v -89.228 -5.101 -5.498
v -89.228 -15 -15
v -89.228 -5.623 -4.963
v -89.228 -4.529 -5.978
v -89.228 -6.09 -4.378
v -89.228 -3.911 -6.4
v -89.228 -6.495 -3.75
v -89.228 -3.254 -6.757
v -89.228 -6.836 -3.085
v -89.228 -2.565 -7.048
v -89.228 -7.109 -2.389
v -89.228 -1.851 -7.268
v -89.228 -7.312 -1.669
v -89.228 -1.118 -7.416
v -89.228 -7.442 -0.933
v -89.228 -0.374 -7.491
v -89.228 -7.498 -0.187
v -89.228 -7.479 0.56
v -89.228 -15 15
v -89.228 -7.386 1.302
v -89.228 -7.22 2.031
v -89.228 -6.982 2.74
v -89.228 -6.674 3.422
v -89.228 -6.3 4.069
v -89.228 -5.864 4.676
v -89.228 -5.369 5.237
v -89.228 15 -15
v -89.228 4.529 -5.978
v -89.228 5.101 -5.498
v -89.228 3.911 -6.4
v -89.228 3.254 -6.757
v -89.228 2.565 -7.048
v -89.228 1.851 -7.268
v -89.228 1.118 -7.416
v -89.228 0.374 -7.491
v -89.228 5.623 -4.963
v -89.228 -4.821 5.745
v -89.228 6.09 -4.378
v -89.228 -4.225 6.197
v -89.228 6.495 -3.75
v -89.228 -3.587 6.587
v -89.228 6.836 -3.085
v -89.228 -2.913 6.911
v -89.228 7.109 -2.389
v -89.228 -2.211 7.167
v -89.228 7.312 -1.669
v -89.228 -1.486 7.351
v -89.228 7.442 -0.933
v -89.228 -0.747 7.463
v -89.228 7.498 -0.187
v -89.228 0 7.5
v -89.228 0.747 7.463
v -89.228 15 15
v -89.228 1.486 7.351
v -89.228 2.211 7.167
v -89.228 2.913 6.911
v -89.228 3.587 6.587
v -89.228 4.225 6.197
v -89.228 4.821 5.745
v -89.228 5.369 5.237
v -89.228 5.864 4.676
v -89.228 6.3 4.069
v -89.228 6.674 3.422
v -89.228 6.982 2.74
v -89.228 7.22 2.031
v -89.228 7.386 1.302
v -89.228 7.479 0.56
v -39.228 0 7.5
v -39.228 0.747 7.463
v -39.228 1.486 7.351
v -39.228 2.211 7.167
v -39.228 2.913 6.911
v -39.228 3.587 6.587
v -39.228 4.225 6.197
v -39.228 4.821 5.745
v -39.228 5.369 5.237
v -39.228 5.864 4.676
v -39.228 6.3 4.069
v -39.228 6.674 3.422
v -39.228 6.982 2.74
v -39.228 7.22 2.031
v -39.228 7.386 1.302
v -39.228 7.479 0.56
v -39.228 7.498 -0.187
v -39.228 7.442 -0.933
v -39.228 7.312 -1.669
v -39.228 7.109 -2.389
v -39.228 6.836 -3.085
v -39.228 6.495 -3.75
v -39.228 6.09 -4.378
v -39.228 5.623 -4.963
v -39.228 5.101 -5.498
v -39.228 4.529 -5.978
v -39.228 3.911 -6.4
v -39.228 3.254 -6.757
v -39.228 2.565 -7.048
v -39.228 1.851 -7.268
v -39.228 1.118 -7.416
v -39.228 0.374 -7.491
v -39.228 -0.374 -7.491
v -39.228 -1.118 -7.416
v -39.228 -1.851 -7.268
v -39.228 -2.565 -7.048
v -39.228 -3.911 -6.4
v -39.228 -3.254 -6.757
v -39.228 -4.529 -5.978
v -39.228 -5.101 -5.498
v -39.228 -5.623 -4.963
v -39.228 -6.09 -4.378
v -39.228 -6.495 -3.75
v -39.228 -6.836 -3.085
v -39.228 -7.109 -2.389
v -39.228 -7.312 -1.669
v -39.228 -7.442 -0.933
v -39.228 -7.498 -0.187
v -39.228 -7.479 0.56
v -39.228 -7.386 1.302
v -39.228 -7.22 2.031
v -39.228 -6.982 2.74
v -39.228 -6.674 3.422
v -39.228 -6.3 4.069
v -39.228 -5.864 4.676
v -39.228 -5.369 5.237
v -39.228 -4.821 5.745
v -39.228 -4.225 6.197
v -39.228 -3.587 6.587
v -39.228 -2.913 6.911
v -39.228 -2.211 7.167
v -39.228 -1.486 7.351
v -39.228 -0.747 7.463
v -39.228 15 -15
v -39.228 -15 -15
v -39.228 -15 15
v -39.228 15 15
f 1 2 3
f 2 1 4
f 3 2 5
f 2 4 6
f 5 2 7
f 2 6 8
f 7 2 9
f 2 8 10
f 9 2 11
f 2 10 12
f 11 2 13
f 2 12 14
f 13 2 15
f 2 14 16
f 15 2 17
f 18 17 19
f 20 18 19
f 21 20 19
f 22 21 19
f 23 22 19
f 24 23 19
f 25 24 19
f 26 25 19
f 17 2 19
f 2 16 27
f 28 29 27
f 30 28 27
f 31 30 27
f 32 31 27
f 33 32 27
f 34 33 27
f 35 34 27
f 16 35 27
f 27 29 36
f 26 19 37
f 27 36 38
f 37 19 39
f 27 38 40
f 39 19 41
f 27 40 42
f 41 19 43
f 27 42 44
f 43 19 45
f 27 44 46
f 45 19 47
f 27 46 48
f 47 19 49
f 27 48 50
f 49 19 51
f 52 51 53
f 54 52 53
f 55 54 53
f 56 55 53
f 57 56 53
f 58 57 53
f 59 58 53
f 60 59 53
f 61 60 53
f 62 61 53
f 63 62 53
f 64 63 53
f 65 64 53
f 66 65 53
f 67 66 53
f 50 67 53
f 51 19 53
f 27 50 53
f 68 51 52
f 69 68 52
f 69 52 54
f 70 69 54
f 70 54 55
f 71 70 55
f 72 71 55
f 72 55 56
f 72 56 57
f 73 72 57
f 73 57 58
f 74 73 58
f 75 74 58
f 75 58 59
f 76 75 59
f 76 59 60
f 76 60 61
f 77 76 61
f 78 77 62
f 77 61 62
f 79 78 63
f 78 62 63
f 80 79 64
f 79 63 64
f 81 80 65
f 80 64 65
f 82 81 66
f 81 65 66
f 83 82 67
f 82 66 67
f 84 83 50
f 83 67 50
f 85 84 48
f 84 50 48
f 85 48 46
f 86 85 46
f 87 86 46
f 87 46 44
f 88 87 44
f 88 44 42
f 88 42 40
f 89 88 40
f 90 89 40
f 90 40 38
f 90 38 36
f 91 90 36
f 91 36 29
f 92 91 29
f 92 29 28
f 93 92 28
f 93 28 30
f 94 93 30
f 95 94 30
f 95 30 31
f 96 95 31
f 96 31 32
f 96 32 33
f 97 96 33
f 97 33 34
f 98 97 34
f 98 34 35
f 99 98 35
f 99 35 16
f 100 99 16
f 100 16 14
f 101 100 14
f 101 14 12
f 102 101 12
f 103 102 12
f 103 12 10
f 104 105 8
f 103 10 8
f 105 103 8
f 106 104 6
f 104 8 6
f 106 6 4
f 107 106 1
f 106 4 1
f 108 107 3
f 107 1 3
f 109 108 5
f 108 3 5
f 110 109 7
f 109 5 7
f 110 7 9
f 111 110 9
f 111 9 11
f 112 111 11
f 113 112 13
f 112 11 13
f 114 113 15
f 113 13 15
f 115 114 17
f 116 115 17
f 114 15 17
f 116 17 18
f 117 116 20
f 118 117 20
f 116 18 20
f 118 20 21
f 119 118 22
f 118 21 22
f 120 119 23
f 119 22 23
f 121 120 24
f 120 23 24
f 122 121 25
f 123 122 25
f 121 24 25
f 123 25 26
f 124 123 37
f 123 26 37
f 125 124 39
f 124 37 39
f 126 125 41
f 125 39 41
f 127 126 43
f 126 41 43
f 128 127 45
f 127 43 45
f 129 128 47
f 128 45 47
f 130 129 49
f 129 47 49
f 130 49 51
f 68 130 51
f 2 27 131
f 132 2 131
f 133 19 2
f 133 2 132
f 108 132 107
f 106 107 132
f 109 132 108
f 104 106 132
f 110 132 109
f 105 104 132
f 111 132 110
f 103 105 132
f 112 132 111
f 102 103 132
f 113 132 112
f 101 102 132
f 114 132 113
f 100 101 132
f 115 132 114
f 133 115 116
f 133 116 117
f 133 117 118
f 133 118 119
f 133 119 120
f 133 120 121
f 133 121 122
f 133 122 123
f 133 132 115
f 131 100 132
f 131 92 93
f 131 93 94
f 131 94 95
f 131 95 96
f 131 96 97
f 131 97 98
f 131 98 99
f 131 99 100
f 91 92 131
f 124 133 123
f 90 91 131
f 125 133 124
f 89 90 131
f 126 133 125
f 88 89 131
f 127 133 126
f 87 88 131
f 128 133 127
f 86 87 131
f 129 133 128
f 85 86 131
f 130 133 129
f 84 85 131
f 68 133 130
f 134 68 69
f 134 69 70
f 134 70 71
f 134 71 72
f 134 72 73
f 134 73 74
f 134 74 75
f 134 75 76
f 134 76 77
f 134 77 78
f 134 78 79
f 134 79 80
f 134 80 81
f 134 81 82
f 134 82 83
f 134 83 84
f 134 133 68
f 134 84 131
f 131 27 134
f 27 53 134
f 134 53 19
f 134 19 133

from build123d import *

# Parameters (mm, degrees)
CROQUIS1_W              = 50
CROQUIS1_H              = 30
SALIENTE_EXTRUIR1_DEPTH = 15
CROQUIS2_R              = 7.5
CORTAR_EXTRUIR1_DEPTH   = 55.313902456


with BuildPart() as part:
    # Croquis1 → Saliente-Extruir1 (new, symmetric)
    with BuildSketch(Plane.XY):
        with Locations((-64.227817577, 0)):
            Rectangle(CROQUIS1_W, CROQUIS1_H)
    extrude(amount=SALIENTE_EXTRUIR1_DEPTH, both=True)

    # Croquis2 → Cortar-Extruir1 (cut, through all)
    with BuildSketch(Plane.ZY.offset(89.227817577)):
        Circle(CROQUIS2_R)
    extrude(amount=-CORTAR_EXTRUIR1_DEPTH, mode=Mode.SUBTRACT)


solid = part.part
